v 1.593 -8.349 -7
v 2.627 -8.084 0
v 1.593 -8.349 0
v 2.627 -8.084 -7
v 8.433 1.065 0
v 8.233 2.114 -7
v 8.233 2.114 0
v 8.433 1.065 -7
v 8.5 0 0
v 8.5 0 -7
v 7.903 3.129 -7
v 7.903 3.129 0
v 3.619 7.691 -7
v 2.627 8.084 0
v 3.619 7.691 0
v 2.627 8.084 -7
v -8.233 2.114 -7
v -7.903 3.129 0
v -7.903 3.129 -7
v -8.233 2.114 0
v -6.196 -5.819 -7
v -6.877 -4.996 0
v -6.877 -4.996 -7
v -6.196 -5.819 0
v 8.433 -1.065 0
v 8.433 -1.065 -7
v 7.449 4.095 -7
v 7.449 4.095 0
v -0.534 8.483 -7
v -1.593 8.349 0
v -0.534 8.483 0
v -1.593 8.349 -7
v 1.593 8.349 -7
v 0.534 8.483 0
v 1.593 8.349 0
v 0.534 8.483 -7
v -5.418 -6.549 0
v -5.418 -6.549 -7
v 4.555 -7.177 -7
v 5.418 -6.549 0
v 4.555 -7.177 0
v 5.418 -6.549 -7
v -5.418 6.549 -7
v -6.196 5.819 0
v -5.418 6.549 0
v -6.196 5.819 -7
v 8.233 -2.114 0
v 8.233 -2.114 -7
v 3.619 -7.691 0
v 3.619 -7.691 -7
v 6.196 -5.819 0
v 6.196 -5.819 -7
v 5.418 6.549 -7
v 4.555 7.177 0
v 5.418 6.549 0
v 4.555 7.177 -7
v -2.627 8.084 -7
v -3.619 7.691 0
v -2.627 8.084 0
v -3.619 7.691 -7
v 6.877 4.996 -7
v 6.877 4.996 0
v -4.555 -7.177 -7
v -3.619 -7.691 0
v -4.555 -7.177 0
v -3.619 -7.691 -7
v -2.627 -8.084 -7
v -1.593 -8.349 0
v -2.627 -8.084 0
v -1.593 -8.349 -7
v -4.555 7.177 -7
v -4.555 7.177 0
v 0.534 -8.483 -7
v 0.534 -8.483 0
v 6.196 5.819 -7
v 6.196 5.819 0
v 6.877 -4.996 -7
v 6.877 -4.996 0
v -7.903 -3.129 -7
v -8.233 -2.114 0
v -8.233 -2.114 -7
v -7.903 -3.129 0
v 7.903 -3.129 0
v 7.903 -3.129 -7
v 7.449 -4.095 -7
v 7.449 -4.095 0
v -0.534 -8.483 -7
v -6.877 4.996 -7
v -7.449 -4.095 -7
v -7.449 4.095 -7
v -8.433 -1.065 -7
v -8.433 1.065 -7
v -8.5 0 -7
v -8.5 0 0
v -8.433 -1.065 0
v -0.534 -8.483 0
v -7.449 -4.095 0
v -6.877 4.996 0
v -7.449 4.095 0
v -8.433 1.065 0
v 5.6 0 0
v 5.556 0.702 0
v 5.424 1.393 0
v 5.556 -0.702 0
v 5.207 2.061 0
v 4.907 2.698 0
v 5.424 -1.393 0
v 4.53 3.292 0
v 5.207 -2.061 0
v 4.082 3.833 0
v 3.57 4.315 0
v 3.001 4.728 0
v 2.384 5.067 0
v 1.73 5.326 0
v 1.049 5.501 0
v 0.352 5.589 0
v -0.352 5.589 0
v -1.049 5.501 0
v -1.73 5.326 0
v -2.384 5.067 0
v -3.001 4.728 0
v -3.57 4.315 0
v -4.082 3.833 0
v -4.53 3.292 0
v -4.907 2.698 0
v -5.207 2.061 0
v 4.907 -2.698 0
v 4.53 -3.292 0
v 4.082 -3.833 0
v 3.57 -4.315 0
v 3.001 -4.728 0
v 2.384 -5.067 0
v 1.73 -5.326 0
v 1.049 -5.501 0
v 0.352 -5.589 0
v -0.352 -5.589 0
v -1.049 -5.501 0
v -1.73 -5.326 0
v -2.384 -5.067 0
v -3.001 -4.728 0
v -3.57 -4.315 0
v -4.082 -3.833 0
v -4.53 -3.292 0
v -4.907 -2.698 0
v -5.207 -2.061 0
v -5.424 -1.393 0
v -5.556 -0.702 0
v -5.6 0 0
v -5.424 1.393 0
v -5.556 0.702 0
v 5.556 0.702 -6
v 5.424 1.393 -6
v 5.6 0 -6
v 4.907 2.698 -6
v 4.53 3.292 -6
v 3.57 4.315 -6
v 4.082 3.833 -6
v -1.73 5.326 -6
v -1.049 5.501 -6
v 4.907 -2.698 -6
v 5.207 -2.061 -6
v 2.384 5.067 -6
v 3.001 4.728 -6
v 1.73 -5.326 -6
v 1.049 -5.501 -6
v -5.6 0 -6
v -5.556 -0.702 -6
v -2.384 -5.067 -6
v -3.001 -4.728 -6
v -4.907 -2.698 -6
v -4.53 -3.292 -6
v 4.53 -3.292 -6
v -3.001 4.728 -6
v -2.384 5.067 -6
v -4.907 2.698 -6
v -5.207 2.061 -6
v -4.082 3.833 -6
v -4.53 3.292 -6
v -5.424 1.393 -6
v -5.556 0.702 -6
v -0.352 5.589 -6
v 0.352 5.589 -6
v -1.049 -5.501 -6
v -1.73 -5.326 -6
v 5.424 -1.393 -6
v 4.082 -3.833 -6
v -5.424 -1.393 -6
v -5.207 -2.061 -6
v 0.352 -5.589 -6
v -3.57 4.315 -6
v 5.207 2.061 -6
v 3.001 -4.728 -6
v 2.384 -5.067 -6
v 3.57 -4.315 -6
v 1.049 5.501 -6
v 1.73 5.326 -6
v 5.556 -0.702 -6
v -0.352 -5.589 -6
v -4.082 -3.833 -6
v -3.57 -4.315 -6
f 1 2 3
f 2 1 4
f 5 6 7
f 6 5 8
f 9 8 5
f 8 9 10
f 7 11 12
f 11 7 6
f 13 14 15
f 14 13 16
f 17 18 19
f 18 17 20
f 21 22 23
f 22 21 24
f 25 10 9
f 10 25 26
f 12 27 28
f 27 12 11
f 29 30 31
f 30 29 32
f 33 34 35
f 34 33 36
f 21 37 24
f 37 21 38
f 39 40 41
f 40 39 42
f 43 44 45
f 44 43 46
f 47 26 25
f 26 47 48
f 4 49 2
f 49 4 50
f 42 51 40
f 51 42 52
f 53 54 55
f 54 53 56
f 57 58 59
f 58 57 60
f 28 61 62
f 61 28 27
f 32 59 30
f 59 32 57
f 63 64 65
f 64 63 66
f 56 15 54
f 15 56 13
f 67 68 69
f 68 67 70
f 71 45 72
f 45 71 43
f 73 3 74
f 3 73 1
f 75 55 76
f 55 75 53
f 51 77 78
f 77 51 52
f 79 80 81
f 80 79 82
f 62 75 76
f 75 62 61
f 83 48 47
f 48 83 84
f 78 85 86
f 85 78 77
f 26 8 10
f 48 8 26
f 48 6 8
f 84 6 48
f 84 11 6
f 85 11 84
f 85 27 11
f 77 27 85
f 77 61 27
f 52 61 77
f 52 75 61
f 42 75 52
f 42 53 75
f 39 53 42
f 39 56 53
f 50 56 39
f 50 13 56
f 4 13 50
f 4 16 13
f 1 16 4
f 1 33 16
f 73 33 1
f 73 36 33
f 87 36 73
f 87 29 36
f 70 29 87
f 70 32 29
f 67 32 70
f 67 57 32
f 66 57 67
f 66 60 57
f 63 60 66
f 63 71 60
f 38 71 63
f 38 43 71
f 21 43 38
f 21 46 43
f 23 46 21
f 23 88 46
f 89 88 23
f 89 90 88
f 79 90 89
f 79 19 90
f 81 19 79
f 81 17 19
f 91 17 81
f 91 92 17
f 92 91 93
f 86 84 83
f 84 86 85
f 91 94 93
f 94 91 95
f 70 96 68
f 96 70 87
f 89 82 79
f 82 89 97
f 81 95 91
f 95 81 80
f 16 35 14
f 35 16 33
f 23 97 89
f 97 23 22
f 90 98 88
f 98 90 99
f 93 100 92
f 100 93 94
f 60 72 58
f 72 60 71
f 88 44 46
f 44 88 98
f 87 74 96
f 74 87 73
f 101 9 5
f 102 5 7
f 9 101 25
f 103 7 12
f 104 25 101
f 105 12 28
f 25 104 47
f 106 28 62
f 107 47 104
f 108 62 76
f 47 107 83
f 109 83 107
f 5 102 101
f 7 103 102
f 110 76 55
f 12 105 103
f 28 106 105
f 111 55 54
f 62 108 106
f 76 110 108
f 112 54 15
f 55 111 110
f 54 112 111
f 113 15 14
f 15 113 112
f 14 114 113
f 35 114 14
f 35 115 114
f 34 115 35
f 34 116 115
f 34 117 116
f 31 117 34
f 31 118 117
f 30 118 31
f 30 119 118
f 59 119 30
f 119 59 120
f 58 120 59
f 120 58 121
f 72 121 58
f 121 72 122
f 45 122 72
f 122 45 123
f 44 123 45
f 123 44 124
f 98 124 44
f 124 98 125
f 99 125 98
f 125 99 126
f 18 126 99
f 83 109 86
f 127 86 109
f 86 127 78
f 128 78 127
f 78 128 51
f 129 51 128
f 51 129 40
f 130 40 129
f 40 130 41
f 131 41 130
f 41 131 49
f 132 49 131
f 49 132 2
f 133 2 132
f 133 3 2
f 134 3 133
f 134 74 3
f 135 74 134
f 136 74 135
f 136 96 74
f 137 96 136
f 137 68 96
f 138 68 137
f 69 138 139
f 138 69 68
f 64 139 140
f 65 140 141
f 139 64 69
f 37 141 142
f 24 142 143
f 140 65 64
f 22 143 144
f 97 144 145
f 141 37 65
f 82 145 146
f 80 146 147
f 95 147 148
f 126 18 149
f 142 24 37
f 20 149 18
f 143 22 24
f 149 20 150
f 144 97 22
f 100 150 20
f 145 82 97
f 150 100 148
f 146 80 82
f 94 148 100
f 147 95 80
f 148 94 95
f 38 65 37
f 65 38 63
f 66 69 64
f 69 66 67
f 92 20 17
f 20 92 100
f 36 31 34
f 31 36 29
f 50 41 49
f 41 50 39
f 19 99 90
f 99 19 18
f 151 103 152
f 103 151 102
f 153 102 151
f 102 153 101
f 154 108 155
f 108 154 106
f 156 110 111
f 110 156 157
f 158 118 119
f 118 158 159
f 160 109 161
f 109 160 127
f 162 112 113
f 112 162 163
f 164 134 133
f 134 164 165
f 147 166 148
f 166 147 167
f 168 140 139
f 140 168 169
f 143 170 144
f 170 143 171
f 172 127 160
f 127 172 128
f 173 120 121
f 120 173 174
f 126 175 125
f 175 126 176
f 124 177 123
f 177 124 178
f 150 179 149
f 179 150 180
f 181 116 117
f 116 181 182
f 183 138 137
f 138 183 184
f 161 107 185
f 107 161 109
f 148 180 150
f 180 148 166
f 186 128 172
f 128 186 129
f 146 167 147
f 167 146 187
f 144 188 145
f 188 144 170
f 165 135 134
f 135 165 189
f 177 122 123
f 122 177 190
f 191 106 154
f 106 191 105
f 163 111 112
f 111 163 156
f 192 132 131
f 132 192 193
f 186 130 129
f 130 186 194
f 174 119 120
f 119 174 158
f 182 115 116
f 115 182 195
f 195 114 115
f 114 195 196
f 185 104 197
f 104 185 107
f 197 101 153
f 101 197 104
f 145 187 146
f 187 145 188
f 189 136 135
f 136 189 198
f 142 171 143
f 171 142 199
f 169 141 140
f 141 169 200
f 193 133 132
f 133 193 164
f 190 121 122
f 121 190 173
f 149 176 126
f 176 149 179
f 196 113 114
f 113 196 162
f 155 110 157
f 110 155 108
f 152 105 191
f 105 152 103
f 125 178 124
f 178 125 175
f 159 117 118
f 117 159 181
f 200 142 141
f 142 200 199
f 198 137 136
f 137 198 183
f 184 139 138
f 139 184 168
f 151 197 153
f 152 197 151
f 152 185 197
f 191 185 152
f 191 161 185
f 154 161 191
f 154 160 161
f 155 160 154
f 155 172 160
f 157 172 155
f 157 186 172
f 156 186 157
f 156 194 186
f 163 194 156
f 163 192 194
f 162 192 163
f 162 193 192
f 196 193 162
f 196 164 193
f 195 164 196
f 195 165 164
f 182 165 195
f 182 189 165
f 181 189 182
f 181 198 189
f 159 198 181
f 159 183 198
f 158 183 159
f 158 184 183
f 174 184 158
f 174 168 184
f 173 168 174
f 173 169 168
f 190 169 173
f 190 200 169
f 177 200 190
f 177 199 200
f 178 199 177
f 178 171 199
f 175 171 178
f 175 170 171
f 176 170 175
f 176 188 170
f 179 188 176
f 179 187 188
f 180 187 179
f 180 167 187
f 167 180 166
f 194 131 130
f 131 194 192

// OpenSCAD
$fn = 50;


difference() {
	union() {
		translate(v = [0, 0, -7.0000000000]) {
			cylinder(h = 7, r = 8.5000000000);
		}
	}
	union() {
		#translate(v = [0, 0, -6.0000000000]) {
			cylinder(h = 6, r = 5.6000000000);
		}
	}
}
